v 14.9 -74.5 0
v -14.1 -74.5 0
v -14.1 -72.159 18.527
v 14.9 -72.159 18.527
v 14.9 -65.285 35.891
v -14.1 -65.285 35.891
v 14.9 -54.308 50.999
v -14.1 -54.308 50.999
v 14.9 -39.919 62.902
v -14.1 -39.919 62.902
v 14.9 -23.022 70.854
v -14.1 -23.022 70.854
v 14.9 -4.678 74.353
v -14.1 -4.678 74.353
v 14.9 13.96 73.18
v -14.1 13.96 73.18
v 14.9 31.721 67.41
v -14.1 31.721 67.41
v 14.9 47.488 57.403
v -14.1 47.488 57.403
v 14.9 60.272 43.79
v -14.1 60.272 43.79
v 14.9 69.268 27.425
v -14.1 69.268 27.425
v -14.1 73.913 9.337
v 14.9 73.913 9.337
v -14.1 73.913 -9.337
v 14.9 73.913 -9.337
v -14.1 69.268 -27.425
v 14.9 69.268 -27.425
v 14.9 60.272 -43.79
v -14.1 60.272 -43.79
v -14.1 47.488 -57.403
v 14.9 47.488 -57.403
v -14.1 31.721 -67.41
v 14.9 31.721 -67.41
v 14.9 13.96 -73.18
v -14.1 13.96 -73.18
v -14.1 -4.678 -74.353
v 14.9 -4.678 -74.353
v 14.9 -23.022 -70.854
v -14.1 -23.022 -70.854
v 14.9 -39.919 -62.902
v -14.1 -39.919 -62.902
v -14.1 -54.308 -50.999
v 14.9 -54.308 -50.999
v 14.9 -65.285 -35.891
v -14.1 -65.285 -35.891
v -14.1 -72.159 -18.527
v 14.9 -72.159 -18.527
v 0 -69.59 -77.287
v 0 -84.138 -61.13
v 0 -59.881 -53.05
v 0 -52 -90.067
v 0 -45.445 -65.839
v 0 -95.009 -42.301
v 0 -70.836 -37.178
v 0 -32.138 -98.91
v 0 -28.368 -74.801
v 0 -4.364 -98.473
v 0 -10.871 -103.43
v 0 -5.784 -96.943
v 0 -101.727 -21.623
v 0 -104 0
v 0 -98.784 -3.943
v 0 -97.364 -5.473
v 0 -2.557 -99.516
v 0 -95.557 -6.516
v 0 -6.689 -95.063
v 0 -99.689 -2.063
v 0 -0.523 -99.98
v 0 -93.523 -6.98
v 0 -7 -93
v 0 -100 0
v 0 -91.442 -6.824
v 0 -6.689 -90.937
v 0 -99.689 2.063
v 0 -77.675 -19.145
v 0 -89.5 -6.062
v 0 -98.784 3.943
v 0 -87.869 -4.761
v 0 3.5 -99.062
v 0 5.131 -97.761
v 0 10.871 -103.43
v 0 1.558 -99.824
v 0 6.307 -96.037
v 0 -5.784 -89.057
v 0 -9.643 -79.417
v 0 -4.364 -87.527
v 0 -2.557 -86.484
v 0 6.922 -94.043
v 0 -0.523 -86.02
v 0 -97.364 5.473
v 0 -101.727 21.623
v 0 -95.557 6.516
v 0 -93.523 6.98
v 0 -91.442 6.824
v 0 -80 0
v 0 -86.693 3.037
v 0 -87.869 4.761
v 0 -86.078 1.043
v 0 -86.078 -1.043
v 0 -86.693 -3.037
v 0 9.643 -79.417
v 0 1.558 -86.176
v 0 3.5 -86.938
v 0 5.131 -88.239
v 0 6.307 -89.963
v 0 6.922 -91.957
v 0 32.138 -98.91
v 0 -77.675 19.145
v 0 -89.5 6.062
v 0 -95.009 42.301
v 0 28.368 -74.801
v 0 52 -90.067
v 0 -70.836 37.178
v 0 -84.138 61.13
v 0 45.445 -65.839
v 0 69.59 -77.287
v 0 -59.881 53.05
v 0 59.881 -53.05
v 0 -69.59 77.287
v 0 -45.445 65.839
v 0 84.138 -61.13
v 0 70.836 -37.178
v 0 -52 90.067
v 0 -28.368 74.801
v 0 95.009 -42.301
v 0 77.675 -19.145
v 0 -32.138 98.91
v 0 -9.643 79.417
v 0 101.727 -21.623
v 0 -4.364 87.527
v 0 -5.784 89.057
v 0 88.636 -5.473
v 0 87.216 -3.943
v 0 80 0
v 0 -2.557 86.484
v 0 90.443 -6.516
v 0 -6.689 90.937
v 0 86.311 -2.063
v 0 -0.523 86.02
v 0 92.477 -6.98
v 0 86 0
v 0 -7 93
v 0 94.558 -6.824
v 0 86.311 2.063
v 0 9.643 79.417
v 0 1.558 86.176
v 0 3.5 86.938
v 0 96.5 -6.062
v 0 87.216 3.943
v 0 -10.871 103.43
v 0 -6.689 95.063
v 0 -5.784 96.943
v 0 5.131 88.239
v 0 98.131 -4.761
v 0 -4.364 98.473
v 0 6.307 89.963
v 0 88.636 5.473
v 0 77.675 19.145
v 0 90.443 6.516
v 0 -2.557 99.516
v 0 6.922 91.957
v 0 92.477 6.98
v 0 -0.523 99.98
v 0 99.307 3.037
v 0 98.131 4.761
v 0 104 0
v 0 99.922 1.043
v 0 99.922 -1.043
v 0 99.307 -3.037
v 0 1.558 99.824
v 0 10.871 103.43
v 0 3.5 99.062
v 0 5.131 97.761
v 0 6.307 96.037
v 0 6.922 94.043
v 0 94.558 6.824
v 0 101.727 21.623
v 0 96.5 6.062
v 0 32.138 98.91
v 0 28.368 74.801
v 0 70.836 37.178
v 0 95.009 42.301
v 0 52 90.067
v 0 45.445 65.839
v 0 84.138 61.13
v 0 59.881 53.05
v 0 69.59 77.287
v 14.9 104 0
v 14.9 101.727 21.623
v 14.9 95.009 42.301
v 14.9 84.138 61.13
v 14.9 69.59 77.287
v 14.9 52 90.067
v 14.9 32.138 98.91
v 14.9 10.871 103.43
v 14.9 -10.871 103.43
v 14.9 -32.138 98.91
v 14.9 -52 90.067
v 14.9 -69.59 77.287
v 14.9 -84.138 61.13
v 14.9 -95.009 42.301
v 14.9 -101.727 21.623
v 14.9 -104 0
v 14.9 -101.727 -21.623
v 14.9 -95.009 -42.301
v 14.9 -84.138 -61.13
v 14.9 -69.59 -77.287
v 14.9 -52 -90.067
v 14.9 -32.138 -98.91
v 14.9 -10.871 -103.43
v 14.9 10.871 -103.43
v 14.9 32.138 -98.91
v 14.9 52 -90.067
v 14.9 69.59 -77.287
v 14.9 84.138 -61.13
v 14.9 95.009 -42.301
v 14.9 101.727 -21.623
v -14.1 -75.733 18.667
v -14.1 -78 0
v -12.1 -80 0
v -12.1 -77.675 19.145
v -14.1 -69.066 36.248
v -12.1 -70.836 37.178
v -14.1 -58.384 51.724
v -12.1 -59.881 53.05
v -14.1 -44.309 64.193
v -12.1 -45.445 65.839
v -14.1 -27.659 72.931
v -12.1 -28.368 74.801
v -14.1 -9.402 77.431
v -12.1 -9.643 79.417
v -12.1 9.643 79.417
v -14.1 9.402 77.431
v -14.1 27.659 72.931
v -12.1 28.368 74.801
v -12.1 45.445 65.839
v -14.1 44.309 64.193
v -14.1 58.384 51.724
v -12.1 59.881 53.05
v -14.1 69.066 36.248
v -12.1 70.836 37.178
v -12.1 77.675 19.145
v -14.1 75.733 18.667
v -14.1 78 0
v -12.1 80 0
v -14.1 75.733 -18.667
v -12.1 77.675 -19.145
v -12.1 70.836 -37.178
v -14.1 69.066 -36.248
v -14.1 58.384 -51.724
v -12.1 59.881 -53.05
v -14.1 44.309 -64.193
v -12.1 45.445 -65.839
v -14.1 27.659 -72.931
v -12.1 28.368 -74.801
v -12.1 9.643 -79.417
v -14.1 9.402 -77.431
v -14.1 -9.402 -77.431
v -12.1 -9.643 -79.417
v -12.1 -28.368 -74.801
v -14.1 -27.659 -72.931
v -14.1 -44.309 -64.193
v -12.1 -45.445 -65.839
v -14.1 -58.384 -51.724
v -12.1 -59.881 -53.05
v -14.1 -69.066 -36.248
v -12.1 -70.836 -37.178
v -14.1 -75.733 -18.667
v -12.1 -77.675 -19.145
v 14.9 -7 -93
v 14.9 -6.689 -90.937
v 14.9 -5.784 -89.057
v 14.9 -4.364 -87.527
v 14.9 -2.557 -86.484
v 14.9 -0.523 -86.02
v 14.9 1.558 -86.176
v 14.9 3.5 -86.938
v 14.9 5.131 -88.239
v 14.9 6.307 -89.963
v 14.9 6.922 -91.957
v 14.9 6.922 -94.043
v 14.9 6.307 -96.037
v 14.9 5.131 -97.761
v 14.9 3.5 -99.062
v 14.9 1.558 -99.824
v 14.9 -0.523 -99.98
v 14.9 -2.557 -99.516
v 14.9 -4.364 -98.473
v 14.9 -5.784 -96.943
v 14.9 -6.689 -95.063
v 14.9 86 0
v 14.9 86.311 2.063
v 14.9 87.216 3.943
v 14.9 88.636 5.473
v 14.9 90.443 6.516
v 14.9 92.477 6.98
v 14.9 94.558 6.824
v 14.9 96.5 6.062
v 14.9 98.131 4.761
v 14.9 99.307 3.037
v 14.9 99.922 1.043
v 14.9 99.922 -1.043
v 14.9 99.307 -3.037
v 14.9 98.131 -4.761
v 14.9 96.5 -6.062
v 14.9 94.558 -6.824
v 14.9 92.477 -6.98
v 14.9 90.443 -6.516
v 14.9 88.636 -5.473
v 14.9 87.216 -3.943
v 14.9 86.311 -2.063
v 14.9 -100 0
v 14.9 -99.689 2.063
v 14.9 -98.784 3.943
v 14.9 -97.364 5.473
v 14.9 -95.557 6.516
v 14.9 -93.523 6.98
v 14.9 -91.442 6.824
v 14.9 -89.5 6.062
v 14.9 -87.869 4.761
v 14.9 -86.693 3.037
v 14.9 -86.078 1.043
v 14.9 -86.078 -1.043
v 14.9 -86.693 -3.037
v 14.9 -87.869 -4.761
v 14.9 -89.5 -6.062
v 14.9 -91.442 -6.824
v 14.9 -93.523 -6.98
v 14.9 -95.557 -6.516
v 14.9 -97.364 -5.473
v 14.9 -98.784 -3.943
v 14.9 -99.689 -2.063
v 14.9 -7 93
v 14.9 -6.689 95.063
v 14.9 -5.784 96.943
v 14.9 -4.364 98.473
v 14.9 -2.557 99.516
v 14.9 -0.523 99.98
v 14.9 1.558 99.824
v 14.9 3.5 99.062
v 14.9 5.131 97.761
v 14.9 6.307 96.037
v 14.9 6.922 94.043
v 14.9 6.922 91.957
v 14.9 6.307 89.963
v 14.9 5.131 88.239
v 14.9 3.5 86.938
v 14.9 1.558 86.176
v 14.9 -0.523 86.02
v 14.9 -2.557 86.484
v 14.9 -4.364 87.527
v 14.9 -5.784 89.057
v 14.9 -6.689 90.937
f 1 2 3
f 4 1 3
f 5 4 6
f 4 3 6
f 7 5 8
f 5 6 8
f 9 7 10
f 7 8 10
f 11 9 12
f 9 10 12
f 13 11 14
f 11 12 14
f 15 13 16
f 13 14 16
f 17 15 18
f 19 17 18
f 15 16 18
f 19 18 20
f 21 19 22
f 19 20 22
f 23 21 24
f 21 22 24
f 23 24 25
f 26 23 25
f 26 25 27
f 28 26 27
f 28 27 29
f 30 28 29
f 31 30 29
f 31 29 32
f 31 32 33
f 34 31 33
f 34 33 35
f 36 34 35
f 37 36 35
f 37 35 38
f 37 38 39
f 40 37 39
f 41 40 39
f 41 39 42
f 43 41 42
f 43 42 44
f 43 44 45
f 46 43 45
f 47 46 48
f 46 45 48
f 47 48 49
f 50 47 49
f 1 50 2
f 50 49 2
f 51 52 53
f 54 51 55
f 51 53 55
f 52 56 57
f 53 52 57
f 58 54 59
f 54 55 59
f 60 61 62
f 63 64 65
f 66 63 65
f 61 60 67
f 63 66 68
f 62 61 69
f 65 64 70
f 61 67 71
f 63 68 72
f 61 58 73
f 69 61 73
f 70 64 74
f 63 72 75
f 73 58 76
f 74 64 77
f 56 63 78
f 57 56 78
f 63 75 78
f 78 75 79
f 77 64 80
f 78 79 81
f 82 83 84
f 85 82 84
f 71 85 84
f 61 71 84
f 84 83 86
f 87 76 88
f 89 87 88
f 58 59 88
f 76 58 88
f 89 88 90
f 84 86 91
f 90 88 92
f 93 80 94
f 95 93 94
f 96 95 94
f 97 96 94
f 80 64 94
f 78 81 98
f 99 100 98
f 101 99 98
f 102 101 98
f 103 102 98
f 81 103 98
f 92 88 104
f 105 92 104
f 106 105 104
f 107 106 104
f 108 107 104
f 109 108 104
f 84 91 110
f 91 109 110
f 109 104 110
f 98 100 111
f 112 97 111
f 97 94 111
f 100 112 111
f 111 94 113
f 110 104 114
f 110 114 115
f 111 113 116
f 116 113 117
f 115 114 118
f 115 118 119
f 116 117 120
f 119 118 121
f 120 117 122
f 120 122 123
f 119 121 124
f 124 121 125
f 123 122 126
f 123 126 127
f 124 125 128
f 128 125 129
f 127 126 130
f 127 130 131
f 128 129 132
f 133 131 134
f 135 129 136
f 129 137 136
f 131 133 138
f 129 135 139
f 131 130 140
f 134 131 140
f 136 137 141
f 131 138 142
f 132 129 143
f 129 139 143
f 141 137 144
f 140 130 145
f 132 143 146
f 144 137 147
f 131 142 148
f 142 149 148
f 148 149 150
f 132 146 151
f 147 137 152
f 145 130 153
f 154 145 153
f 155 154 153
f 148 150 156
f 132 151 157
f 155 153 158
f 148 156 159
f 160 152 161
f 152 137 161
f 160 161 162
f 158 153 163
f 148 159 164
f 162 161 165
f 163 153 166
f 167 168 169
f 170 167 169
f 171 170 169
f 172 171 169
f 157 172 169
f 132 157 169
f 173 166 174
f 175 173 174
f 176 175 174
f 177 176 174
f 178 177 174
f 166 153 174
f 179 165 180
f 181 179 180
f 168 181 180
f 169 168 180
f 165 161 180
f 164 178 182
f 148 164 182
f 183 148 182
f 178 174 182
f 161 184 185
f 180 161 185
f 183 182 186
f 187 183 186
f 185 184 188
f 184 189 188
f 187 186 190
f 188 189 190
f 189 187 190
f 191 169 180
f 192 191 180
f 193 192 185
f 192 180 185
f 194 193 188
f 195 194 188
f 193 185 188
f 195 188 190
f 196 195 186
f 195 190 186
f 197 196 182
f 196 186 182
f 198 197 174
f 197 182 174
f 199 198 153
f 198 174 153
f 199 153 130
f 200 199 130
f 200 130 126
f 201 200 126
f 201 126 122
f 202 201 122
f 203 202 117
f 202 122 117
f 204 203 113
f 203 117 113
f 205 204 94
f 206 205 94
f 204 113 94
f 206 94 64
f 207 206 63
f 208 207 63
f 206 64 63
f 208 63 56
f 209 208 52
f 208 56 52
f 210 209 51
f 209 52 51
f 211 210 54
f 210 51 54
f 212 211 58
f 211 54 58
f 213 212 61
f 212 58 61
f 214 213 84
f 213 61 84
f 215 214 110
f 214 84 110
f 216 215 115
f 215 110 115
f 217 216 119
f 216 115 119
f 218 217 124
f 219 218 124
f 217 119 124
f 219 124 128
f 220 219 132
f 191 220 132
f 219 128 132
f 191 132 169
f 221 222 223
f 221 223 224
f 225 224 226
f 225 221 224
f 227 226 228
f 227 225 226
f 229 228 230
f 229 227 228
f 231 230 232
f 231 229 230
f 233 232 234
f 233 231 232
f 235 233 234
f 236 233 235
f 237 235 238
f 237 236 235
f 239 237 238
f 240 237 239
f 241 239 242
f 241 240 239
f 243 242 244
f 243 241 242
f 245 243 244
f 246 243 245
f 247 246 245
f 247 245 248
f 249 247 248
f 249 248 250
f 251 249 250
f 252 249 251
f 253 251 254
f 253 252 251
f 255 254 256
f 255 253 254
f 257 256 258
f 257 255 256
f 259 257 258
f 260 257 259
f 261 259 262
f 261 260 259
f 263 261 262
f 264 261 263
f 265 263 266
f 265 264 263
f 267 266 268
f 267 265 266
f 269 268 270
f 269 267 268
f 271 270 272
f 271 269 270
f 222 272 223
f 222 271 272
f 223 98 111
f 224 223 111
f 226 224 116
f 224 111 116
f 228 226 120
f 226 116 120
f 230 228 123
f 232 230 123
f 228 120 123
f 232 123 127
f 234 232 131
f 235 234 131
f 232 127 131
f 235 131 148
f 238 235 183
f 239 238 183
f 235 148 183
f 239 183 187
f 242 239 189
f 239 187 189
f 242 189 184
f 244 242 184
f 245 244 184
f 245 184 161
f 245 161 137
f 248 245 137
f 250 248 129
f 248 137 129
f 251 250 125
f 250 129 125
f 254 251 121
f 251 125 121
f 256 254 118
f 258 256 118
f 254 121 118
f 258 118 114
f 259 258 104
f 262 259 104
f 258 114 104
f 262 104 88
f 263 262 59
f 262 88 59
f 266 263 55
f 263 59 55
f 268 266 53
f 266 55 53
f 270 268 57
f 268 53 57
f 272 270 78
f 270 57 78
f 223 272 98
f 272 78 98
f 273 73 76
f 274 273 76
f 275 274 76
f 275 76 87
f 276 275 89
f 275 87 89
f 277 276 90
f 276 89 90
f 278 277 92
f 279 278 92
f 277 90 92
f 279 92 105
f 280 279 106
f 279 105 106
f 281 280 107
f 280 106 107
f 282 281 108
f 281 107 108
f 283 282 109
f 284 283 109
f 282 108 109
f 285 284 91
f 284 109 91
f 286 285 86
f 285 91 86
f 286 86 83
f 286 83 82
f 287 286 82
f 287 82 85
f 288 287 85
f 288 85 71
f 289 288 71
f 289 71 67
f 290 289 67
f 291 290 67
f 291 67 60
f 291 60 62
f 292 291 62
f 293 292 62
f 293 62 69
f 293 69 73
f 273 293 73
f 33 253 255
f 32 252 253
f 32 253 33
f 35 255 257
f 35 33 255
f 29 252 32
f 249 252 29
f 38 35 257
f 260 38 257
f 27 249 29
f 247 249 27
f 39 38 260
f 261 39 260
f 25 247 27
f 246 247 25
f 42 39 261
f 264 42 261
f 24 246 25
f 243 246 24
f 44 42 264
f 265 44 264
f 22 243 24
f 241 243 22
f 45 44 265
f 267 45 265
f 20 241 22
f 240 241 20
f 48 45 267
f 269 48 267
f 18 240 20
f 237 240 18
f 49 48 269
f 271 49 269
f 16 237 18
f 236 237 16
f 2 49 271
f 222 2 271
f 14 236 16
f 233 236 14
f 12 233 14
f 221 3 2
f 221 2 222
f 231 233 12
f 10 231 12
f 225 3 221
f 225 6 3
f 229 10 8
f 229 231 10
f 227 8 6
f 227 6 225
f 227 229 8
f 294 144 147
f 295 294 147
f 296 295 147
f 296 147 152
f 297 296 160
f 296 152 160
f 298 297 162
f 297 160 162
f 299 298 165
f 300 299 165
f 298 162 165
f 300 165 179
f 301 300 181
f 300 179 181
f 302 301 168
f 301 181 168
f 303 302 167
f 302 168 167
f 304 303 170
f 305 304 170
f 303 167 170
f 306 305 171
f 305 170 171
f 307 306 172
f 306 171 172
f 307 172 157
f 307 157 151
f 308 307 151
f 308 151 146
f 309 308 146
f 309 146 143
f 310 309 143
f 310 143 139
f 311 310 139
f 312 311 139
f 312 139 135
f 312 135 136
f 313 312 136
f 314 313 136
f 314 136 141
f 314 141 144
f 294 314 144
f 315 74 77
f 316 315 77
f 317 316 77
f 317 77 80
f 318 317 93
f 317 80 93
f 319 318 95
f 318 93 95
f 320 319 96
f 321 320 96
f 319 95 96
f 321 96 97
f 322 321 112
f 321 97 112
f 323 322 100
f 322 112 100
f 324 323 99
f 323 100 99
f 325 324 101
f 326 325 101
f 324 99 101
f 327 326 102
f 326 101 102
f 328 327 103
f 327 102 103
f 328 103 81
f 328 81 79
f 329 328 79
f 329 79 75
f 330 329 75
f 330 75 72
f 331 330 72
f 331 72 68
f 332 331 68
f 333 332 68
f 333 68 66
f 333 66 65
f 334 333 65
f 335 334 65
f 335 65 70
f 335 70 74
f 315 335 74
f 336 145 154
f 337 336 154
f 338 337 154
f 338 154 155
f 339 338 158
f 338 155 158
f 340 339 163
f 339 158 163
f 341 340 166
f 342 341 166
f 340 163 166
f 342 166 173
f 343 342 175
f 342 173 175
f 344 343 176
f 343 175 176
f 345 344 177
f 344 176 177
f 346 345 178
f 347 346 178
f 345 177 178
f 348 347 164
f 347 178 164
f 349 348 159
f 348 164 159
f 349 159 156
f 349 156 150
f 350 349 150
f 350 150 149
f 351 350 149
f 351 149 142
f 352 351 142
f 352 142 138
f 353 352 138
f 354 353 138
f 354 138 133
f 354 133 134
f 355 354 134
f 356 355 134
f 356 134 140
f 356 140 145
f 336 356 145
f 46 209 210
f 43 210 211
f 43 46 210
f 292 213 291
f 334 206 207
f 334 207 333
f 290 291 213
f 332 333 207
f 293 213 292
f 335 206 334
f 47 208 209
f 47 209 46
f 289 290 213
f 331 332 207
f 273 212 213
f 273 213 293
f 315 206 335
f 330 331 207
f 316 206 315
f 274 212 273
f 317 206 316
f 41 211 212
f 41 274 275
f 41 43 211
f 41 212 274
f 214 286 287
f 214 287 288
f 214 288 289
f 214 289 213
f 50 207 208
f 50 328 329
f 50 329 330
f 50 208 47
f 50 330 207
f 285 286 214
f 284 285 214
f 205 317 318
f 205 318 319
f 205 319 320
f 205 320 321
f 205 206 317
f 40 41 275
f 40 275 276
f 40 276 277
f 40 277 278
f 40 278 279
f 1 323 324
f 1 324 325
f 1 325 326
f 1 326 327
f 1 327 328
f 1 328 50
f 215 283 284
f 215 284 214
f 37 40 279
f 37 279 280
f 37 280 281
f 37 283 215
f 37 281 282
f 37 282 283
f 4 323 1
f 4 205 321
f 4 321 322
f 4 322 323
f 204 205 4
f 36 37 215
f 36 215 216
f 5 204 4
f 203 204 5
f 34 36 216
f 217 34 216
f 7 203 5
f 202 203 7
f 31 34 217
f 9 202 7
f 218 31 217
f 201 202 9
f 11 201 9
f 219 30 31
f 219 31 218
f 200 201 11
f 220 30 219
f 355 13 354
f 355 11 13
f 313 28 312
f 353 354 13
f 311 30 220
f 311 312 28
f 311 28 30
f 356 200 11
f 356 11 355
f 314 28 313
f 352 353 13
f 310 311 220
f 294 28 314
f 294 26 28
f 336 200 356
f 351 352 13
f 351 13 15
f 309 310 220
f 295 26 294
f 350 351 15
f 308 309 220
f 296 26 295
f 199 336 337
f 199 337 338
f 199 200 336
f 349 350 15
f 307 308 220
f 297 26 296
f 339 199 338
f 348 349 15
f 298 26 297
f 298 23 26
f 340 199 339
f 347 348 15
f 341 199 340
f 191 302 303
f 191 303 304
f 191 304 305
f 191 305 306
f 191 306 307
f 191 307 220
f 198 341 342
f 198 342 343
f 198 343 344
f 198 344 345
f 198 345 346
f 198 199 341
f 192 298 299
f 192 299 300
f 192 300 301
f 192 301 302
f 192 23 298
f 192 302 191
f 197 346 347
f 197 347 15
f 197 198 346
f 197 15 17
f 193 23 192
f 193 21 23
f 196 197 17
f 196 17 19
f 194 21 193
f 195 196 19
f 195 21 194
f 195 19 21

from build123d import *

# Parameters (mm, degrees)
F0_R     = 104
F1_DEPTH = 14.9
F2_R     = 80
F3_DEPTH = 14.1
F4_SIZE  = 2
F6_D     = 149
F8_D     = 14


with BuildPart() as f1:
    # F0 (on Right) → F1 (new body)
    with BuildSketch(Plane.YZ):
        Circle(F0_R)
    extrude(amount=F1_DEPTH)

    # F2 (on face) → F3 (join)
    with BuildSketch(Plane(origin=(0, 0, 0), x_dir=(0, -1, 0), z_dir=(-1, 0, 0))):
        Circle(F2_R)
    extrude(amount=F3_DEPTH)

    # F4
    f4_edges = [f1.edges().sort_by_distance(p)[0] for p in [
        (-14.1, 80, 0),
    ]]
    chamfer(f4_edges, length=F4_SIZE)

    # F6 (through all)
    with Locations(Plane.YZ.offset(14.9)):
        with Locations((0, 0)):
            Hole(F6_D / 2)

    # F8 (through all)
    with Locations(Plane.YZ.offset(14.9)):
        with Locations((93, 0), (0, -93), (-93, 0), (0, 93)):
            Hole(F8_D / 2)


solid = f1.part
